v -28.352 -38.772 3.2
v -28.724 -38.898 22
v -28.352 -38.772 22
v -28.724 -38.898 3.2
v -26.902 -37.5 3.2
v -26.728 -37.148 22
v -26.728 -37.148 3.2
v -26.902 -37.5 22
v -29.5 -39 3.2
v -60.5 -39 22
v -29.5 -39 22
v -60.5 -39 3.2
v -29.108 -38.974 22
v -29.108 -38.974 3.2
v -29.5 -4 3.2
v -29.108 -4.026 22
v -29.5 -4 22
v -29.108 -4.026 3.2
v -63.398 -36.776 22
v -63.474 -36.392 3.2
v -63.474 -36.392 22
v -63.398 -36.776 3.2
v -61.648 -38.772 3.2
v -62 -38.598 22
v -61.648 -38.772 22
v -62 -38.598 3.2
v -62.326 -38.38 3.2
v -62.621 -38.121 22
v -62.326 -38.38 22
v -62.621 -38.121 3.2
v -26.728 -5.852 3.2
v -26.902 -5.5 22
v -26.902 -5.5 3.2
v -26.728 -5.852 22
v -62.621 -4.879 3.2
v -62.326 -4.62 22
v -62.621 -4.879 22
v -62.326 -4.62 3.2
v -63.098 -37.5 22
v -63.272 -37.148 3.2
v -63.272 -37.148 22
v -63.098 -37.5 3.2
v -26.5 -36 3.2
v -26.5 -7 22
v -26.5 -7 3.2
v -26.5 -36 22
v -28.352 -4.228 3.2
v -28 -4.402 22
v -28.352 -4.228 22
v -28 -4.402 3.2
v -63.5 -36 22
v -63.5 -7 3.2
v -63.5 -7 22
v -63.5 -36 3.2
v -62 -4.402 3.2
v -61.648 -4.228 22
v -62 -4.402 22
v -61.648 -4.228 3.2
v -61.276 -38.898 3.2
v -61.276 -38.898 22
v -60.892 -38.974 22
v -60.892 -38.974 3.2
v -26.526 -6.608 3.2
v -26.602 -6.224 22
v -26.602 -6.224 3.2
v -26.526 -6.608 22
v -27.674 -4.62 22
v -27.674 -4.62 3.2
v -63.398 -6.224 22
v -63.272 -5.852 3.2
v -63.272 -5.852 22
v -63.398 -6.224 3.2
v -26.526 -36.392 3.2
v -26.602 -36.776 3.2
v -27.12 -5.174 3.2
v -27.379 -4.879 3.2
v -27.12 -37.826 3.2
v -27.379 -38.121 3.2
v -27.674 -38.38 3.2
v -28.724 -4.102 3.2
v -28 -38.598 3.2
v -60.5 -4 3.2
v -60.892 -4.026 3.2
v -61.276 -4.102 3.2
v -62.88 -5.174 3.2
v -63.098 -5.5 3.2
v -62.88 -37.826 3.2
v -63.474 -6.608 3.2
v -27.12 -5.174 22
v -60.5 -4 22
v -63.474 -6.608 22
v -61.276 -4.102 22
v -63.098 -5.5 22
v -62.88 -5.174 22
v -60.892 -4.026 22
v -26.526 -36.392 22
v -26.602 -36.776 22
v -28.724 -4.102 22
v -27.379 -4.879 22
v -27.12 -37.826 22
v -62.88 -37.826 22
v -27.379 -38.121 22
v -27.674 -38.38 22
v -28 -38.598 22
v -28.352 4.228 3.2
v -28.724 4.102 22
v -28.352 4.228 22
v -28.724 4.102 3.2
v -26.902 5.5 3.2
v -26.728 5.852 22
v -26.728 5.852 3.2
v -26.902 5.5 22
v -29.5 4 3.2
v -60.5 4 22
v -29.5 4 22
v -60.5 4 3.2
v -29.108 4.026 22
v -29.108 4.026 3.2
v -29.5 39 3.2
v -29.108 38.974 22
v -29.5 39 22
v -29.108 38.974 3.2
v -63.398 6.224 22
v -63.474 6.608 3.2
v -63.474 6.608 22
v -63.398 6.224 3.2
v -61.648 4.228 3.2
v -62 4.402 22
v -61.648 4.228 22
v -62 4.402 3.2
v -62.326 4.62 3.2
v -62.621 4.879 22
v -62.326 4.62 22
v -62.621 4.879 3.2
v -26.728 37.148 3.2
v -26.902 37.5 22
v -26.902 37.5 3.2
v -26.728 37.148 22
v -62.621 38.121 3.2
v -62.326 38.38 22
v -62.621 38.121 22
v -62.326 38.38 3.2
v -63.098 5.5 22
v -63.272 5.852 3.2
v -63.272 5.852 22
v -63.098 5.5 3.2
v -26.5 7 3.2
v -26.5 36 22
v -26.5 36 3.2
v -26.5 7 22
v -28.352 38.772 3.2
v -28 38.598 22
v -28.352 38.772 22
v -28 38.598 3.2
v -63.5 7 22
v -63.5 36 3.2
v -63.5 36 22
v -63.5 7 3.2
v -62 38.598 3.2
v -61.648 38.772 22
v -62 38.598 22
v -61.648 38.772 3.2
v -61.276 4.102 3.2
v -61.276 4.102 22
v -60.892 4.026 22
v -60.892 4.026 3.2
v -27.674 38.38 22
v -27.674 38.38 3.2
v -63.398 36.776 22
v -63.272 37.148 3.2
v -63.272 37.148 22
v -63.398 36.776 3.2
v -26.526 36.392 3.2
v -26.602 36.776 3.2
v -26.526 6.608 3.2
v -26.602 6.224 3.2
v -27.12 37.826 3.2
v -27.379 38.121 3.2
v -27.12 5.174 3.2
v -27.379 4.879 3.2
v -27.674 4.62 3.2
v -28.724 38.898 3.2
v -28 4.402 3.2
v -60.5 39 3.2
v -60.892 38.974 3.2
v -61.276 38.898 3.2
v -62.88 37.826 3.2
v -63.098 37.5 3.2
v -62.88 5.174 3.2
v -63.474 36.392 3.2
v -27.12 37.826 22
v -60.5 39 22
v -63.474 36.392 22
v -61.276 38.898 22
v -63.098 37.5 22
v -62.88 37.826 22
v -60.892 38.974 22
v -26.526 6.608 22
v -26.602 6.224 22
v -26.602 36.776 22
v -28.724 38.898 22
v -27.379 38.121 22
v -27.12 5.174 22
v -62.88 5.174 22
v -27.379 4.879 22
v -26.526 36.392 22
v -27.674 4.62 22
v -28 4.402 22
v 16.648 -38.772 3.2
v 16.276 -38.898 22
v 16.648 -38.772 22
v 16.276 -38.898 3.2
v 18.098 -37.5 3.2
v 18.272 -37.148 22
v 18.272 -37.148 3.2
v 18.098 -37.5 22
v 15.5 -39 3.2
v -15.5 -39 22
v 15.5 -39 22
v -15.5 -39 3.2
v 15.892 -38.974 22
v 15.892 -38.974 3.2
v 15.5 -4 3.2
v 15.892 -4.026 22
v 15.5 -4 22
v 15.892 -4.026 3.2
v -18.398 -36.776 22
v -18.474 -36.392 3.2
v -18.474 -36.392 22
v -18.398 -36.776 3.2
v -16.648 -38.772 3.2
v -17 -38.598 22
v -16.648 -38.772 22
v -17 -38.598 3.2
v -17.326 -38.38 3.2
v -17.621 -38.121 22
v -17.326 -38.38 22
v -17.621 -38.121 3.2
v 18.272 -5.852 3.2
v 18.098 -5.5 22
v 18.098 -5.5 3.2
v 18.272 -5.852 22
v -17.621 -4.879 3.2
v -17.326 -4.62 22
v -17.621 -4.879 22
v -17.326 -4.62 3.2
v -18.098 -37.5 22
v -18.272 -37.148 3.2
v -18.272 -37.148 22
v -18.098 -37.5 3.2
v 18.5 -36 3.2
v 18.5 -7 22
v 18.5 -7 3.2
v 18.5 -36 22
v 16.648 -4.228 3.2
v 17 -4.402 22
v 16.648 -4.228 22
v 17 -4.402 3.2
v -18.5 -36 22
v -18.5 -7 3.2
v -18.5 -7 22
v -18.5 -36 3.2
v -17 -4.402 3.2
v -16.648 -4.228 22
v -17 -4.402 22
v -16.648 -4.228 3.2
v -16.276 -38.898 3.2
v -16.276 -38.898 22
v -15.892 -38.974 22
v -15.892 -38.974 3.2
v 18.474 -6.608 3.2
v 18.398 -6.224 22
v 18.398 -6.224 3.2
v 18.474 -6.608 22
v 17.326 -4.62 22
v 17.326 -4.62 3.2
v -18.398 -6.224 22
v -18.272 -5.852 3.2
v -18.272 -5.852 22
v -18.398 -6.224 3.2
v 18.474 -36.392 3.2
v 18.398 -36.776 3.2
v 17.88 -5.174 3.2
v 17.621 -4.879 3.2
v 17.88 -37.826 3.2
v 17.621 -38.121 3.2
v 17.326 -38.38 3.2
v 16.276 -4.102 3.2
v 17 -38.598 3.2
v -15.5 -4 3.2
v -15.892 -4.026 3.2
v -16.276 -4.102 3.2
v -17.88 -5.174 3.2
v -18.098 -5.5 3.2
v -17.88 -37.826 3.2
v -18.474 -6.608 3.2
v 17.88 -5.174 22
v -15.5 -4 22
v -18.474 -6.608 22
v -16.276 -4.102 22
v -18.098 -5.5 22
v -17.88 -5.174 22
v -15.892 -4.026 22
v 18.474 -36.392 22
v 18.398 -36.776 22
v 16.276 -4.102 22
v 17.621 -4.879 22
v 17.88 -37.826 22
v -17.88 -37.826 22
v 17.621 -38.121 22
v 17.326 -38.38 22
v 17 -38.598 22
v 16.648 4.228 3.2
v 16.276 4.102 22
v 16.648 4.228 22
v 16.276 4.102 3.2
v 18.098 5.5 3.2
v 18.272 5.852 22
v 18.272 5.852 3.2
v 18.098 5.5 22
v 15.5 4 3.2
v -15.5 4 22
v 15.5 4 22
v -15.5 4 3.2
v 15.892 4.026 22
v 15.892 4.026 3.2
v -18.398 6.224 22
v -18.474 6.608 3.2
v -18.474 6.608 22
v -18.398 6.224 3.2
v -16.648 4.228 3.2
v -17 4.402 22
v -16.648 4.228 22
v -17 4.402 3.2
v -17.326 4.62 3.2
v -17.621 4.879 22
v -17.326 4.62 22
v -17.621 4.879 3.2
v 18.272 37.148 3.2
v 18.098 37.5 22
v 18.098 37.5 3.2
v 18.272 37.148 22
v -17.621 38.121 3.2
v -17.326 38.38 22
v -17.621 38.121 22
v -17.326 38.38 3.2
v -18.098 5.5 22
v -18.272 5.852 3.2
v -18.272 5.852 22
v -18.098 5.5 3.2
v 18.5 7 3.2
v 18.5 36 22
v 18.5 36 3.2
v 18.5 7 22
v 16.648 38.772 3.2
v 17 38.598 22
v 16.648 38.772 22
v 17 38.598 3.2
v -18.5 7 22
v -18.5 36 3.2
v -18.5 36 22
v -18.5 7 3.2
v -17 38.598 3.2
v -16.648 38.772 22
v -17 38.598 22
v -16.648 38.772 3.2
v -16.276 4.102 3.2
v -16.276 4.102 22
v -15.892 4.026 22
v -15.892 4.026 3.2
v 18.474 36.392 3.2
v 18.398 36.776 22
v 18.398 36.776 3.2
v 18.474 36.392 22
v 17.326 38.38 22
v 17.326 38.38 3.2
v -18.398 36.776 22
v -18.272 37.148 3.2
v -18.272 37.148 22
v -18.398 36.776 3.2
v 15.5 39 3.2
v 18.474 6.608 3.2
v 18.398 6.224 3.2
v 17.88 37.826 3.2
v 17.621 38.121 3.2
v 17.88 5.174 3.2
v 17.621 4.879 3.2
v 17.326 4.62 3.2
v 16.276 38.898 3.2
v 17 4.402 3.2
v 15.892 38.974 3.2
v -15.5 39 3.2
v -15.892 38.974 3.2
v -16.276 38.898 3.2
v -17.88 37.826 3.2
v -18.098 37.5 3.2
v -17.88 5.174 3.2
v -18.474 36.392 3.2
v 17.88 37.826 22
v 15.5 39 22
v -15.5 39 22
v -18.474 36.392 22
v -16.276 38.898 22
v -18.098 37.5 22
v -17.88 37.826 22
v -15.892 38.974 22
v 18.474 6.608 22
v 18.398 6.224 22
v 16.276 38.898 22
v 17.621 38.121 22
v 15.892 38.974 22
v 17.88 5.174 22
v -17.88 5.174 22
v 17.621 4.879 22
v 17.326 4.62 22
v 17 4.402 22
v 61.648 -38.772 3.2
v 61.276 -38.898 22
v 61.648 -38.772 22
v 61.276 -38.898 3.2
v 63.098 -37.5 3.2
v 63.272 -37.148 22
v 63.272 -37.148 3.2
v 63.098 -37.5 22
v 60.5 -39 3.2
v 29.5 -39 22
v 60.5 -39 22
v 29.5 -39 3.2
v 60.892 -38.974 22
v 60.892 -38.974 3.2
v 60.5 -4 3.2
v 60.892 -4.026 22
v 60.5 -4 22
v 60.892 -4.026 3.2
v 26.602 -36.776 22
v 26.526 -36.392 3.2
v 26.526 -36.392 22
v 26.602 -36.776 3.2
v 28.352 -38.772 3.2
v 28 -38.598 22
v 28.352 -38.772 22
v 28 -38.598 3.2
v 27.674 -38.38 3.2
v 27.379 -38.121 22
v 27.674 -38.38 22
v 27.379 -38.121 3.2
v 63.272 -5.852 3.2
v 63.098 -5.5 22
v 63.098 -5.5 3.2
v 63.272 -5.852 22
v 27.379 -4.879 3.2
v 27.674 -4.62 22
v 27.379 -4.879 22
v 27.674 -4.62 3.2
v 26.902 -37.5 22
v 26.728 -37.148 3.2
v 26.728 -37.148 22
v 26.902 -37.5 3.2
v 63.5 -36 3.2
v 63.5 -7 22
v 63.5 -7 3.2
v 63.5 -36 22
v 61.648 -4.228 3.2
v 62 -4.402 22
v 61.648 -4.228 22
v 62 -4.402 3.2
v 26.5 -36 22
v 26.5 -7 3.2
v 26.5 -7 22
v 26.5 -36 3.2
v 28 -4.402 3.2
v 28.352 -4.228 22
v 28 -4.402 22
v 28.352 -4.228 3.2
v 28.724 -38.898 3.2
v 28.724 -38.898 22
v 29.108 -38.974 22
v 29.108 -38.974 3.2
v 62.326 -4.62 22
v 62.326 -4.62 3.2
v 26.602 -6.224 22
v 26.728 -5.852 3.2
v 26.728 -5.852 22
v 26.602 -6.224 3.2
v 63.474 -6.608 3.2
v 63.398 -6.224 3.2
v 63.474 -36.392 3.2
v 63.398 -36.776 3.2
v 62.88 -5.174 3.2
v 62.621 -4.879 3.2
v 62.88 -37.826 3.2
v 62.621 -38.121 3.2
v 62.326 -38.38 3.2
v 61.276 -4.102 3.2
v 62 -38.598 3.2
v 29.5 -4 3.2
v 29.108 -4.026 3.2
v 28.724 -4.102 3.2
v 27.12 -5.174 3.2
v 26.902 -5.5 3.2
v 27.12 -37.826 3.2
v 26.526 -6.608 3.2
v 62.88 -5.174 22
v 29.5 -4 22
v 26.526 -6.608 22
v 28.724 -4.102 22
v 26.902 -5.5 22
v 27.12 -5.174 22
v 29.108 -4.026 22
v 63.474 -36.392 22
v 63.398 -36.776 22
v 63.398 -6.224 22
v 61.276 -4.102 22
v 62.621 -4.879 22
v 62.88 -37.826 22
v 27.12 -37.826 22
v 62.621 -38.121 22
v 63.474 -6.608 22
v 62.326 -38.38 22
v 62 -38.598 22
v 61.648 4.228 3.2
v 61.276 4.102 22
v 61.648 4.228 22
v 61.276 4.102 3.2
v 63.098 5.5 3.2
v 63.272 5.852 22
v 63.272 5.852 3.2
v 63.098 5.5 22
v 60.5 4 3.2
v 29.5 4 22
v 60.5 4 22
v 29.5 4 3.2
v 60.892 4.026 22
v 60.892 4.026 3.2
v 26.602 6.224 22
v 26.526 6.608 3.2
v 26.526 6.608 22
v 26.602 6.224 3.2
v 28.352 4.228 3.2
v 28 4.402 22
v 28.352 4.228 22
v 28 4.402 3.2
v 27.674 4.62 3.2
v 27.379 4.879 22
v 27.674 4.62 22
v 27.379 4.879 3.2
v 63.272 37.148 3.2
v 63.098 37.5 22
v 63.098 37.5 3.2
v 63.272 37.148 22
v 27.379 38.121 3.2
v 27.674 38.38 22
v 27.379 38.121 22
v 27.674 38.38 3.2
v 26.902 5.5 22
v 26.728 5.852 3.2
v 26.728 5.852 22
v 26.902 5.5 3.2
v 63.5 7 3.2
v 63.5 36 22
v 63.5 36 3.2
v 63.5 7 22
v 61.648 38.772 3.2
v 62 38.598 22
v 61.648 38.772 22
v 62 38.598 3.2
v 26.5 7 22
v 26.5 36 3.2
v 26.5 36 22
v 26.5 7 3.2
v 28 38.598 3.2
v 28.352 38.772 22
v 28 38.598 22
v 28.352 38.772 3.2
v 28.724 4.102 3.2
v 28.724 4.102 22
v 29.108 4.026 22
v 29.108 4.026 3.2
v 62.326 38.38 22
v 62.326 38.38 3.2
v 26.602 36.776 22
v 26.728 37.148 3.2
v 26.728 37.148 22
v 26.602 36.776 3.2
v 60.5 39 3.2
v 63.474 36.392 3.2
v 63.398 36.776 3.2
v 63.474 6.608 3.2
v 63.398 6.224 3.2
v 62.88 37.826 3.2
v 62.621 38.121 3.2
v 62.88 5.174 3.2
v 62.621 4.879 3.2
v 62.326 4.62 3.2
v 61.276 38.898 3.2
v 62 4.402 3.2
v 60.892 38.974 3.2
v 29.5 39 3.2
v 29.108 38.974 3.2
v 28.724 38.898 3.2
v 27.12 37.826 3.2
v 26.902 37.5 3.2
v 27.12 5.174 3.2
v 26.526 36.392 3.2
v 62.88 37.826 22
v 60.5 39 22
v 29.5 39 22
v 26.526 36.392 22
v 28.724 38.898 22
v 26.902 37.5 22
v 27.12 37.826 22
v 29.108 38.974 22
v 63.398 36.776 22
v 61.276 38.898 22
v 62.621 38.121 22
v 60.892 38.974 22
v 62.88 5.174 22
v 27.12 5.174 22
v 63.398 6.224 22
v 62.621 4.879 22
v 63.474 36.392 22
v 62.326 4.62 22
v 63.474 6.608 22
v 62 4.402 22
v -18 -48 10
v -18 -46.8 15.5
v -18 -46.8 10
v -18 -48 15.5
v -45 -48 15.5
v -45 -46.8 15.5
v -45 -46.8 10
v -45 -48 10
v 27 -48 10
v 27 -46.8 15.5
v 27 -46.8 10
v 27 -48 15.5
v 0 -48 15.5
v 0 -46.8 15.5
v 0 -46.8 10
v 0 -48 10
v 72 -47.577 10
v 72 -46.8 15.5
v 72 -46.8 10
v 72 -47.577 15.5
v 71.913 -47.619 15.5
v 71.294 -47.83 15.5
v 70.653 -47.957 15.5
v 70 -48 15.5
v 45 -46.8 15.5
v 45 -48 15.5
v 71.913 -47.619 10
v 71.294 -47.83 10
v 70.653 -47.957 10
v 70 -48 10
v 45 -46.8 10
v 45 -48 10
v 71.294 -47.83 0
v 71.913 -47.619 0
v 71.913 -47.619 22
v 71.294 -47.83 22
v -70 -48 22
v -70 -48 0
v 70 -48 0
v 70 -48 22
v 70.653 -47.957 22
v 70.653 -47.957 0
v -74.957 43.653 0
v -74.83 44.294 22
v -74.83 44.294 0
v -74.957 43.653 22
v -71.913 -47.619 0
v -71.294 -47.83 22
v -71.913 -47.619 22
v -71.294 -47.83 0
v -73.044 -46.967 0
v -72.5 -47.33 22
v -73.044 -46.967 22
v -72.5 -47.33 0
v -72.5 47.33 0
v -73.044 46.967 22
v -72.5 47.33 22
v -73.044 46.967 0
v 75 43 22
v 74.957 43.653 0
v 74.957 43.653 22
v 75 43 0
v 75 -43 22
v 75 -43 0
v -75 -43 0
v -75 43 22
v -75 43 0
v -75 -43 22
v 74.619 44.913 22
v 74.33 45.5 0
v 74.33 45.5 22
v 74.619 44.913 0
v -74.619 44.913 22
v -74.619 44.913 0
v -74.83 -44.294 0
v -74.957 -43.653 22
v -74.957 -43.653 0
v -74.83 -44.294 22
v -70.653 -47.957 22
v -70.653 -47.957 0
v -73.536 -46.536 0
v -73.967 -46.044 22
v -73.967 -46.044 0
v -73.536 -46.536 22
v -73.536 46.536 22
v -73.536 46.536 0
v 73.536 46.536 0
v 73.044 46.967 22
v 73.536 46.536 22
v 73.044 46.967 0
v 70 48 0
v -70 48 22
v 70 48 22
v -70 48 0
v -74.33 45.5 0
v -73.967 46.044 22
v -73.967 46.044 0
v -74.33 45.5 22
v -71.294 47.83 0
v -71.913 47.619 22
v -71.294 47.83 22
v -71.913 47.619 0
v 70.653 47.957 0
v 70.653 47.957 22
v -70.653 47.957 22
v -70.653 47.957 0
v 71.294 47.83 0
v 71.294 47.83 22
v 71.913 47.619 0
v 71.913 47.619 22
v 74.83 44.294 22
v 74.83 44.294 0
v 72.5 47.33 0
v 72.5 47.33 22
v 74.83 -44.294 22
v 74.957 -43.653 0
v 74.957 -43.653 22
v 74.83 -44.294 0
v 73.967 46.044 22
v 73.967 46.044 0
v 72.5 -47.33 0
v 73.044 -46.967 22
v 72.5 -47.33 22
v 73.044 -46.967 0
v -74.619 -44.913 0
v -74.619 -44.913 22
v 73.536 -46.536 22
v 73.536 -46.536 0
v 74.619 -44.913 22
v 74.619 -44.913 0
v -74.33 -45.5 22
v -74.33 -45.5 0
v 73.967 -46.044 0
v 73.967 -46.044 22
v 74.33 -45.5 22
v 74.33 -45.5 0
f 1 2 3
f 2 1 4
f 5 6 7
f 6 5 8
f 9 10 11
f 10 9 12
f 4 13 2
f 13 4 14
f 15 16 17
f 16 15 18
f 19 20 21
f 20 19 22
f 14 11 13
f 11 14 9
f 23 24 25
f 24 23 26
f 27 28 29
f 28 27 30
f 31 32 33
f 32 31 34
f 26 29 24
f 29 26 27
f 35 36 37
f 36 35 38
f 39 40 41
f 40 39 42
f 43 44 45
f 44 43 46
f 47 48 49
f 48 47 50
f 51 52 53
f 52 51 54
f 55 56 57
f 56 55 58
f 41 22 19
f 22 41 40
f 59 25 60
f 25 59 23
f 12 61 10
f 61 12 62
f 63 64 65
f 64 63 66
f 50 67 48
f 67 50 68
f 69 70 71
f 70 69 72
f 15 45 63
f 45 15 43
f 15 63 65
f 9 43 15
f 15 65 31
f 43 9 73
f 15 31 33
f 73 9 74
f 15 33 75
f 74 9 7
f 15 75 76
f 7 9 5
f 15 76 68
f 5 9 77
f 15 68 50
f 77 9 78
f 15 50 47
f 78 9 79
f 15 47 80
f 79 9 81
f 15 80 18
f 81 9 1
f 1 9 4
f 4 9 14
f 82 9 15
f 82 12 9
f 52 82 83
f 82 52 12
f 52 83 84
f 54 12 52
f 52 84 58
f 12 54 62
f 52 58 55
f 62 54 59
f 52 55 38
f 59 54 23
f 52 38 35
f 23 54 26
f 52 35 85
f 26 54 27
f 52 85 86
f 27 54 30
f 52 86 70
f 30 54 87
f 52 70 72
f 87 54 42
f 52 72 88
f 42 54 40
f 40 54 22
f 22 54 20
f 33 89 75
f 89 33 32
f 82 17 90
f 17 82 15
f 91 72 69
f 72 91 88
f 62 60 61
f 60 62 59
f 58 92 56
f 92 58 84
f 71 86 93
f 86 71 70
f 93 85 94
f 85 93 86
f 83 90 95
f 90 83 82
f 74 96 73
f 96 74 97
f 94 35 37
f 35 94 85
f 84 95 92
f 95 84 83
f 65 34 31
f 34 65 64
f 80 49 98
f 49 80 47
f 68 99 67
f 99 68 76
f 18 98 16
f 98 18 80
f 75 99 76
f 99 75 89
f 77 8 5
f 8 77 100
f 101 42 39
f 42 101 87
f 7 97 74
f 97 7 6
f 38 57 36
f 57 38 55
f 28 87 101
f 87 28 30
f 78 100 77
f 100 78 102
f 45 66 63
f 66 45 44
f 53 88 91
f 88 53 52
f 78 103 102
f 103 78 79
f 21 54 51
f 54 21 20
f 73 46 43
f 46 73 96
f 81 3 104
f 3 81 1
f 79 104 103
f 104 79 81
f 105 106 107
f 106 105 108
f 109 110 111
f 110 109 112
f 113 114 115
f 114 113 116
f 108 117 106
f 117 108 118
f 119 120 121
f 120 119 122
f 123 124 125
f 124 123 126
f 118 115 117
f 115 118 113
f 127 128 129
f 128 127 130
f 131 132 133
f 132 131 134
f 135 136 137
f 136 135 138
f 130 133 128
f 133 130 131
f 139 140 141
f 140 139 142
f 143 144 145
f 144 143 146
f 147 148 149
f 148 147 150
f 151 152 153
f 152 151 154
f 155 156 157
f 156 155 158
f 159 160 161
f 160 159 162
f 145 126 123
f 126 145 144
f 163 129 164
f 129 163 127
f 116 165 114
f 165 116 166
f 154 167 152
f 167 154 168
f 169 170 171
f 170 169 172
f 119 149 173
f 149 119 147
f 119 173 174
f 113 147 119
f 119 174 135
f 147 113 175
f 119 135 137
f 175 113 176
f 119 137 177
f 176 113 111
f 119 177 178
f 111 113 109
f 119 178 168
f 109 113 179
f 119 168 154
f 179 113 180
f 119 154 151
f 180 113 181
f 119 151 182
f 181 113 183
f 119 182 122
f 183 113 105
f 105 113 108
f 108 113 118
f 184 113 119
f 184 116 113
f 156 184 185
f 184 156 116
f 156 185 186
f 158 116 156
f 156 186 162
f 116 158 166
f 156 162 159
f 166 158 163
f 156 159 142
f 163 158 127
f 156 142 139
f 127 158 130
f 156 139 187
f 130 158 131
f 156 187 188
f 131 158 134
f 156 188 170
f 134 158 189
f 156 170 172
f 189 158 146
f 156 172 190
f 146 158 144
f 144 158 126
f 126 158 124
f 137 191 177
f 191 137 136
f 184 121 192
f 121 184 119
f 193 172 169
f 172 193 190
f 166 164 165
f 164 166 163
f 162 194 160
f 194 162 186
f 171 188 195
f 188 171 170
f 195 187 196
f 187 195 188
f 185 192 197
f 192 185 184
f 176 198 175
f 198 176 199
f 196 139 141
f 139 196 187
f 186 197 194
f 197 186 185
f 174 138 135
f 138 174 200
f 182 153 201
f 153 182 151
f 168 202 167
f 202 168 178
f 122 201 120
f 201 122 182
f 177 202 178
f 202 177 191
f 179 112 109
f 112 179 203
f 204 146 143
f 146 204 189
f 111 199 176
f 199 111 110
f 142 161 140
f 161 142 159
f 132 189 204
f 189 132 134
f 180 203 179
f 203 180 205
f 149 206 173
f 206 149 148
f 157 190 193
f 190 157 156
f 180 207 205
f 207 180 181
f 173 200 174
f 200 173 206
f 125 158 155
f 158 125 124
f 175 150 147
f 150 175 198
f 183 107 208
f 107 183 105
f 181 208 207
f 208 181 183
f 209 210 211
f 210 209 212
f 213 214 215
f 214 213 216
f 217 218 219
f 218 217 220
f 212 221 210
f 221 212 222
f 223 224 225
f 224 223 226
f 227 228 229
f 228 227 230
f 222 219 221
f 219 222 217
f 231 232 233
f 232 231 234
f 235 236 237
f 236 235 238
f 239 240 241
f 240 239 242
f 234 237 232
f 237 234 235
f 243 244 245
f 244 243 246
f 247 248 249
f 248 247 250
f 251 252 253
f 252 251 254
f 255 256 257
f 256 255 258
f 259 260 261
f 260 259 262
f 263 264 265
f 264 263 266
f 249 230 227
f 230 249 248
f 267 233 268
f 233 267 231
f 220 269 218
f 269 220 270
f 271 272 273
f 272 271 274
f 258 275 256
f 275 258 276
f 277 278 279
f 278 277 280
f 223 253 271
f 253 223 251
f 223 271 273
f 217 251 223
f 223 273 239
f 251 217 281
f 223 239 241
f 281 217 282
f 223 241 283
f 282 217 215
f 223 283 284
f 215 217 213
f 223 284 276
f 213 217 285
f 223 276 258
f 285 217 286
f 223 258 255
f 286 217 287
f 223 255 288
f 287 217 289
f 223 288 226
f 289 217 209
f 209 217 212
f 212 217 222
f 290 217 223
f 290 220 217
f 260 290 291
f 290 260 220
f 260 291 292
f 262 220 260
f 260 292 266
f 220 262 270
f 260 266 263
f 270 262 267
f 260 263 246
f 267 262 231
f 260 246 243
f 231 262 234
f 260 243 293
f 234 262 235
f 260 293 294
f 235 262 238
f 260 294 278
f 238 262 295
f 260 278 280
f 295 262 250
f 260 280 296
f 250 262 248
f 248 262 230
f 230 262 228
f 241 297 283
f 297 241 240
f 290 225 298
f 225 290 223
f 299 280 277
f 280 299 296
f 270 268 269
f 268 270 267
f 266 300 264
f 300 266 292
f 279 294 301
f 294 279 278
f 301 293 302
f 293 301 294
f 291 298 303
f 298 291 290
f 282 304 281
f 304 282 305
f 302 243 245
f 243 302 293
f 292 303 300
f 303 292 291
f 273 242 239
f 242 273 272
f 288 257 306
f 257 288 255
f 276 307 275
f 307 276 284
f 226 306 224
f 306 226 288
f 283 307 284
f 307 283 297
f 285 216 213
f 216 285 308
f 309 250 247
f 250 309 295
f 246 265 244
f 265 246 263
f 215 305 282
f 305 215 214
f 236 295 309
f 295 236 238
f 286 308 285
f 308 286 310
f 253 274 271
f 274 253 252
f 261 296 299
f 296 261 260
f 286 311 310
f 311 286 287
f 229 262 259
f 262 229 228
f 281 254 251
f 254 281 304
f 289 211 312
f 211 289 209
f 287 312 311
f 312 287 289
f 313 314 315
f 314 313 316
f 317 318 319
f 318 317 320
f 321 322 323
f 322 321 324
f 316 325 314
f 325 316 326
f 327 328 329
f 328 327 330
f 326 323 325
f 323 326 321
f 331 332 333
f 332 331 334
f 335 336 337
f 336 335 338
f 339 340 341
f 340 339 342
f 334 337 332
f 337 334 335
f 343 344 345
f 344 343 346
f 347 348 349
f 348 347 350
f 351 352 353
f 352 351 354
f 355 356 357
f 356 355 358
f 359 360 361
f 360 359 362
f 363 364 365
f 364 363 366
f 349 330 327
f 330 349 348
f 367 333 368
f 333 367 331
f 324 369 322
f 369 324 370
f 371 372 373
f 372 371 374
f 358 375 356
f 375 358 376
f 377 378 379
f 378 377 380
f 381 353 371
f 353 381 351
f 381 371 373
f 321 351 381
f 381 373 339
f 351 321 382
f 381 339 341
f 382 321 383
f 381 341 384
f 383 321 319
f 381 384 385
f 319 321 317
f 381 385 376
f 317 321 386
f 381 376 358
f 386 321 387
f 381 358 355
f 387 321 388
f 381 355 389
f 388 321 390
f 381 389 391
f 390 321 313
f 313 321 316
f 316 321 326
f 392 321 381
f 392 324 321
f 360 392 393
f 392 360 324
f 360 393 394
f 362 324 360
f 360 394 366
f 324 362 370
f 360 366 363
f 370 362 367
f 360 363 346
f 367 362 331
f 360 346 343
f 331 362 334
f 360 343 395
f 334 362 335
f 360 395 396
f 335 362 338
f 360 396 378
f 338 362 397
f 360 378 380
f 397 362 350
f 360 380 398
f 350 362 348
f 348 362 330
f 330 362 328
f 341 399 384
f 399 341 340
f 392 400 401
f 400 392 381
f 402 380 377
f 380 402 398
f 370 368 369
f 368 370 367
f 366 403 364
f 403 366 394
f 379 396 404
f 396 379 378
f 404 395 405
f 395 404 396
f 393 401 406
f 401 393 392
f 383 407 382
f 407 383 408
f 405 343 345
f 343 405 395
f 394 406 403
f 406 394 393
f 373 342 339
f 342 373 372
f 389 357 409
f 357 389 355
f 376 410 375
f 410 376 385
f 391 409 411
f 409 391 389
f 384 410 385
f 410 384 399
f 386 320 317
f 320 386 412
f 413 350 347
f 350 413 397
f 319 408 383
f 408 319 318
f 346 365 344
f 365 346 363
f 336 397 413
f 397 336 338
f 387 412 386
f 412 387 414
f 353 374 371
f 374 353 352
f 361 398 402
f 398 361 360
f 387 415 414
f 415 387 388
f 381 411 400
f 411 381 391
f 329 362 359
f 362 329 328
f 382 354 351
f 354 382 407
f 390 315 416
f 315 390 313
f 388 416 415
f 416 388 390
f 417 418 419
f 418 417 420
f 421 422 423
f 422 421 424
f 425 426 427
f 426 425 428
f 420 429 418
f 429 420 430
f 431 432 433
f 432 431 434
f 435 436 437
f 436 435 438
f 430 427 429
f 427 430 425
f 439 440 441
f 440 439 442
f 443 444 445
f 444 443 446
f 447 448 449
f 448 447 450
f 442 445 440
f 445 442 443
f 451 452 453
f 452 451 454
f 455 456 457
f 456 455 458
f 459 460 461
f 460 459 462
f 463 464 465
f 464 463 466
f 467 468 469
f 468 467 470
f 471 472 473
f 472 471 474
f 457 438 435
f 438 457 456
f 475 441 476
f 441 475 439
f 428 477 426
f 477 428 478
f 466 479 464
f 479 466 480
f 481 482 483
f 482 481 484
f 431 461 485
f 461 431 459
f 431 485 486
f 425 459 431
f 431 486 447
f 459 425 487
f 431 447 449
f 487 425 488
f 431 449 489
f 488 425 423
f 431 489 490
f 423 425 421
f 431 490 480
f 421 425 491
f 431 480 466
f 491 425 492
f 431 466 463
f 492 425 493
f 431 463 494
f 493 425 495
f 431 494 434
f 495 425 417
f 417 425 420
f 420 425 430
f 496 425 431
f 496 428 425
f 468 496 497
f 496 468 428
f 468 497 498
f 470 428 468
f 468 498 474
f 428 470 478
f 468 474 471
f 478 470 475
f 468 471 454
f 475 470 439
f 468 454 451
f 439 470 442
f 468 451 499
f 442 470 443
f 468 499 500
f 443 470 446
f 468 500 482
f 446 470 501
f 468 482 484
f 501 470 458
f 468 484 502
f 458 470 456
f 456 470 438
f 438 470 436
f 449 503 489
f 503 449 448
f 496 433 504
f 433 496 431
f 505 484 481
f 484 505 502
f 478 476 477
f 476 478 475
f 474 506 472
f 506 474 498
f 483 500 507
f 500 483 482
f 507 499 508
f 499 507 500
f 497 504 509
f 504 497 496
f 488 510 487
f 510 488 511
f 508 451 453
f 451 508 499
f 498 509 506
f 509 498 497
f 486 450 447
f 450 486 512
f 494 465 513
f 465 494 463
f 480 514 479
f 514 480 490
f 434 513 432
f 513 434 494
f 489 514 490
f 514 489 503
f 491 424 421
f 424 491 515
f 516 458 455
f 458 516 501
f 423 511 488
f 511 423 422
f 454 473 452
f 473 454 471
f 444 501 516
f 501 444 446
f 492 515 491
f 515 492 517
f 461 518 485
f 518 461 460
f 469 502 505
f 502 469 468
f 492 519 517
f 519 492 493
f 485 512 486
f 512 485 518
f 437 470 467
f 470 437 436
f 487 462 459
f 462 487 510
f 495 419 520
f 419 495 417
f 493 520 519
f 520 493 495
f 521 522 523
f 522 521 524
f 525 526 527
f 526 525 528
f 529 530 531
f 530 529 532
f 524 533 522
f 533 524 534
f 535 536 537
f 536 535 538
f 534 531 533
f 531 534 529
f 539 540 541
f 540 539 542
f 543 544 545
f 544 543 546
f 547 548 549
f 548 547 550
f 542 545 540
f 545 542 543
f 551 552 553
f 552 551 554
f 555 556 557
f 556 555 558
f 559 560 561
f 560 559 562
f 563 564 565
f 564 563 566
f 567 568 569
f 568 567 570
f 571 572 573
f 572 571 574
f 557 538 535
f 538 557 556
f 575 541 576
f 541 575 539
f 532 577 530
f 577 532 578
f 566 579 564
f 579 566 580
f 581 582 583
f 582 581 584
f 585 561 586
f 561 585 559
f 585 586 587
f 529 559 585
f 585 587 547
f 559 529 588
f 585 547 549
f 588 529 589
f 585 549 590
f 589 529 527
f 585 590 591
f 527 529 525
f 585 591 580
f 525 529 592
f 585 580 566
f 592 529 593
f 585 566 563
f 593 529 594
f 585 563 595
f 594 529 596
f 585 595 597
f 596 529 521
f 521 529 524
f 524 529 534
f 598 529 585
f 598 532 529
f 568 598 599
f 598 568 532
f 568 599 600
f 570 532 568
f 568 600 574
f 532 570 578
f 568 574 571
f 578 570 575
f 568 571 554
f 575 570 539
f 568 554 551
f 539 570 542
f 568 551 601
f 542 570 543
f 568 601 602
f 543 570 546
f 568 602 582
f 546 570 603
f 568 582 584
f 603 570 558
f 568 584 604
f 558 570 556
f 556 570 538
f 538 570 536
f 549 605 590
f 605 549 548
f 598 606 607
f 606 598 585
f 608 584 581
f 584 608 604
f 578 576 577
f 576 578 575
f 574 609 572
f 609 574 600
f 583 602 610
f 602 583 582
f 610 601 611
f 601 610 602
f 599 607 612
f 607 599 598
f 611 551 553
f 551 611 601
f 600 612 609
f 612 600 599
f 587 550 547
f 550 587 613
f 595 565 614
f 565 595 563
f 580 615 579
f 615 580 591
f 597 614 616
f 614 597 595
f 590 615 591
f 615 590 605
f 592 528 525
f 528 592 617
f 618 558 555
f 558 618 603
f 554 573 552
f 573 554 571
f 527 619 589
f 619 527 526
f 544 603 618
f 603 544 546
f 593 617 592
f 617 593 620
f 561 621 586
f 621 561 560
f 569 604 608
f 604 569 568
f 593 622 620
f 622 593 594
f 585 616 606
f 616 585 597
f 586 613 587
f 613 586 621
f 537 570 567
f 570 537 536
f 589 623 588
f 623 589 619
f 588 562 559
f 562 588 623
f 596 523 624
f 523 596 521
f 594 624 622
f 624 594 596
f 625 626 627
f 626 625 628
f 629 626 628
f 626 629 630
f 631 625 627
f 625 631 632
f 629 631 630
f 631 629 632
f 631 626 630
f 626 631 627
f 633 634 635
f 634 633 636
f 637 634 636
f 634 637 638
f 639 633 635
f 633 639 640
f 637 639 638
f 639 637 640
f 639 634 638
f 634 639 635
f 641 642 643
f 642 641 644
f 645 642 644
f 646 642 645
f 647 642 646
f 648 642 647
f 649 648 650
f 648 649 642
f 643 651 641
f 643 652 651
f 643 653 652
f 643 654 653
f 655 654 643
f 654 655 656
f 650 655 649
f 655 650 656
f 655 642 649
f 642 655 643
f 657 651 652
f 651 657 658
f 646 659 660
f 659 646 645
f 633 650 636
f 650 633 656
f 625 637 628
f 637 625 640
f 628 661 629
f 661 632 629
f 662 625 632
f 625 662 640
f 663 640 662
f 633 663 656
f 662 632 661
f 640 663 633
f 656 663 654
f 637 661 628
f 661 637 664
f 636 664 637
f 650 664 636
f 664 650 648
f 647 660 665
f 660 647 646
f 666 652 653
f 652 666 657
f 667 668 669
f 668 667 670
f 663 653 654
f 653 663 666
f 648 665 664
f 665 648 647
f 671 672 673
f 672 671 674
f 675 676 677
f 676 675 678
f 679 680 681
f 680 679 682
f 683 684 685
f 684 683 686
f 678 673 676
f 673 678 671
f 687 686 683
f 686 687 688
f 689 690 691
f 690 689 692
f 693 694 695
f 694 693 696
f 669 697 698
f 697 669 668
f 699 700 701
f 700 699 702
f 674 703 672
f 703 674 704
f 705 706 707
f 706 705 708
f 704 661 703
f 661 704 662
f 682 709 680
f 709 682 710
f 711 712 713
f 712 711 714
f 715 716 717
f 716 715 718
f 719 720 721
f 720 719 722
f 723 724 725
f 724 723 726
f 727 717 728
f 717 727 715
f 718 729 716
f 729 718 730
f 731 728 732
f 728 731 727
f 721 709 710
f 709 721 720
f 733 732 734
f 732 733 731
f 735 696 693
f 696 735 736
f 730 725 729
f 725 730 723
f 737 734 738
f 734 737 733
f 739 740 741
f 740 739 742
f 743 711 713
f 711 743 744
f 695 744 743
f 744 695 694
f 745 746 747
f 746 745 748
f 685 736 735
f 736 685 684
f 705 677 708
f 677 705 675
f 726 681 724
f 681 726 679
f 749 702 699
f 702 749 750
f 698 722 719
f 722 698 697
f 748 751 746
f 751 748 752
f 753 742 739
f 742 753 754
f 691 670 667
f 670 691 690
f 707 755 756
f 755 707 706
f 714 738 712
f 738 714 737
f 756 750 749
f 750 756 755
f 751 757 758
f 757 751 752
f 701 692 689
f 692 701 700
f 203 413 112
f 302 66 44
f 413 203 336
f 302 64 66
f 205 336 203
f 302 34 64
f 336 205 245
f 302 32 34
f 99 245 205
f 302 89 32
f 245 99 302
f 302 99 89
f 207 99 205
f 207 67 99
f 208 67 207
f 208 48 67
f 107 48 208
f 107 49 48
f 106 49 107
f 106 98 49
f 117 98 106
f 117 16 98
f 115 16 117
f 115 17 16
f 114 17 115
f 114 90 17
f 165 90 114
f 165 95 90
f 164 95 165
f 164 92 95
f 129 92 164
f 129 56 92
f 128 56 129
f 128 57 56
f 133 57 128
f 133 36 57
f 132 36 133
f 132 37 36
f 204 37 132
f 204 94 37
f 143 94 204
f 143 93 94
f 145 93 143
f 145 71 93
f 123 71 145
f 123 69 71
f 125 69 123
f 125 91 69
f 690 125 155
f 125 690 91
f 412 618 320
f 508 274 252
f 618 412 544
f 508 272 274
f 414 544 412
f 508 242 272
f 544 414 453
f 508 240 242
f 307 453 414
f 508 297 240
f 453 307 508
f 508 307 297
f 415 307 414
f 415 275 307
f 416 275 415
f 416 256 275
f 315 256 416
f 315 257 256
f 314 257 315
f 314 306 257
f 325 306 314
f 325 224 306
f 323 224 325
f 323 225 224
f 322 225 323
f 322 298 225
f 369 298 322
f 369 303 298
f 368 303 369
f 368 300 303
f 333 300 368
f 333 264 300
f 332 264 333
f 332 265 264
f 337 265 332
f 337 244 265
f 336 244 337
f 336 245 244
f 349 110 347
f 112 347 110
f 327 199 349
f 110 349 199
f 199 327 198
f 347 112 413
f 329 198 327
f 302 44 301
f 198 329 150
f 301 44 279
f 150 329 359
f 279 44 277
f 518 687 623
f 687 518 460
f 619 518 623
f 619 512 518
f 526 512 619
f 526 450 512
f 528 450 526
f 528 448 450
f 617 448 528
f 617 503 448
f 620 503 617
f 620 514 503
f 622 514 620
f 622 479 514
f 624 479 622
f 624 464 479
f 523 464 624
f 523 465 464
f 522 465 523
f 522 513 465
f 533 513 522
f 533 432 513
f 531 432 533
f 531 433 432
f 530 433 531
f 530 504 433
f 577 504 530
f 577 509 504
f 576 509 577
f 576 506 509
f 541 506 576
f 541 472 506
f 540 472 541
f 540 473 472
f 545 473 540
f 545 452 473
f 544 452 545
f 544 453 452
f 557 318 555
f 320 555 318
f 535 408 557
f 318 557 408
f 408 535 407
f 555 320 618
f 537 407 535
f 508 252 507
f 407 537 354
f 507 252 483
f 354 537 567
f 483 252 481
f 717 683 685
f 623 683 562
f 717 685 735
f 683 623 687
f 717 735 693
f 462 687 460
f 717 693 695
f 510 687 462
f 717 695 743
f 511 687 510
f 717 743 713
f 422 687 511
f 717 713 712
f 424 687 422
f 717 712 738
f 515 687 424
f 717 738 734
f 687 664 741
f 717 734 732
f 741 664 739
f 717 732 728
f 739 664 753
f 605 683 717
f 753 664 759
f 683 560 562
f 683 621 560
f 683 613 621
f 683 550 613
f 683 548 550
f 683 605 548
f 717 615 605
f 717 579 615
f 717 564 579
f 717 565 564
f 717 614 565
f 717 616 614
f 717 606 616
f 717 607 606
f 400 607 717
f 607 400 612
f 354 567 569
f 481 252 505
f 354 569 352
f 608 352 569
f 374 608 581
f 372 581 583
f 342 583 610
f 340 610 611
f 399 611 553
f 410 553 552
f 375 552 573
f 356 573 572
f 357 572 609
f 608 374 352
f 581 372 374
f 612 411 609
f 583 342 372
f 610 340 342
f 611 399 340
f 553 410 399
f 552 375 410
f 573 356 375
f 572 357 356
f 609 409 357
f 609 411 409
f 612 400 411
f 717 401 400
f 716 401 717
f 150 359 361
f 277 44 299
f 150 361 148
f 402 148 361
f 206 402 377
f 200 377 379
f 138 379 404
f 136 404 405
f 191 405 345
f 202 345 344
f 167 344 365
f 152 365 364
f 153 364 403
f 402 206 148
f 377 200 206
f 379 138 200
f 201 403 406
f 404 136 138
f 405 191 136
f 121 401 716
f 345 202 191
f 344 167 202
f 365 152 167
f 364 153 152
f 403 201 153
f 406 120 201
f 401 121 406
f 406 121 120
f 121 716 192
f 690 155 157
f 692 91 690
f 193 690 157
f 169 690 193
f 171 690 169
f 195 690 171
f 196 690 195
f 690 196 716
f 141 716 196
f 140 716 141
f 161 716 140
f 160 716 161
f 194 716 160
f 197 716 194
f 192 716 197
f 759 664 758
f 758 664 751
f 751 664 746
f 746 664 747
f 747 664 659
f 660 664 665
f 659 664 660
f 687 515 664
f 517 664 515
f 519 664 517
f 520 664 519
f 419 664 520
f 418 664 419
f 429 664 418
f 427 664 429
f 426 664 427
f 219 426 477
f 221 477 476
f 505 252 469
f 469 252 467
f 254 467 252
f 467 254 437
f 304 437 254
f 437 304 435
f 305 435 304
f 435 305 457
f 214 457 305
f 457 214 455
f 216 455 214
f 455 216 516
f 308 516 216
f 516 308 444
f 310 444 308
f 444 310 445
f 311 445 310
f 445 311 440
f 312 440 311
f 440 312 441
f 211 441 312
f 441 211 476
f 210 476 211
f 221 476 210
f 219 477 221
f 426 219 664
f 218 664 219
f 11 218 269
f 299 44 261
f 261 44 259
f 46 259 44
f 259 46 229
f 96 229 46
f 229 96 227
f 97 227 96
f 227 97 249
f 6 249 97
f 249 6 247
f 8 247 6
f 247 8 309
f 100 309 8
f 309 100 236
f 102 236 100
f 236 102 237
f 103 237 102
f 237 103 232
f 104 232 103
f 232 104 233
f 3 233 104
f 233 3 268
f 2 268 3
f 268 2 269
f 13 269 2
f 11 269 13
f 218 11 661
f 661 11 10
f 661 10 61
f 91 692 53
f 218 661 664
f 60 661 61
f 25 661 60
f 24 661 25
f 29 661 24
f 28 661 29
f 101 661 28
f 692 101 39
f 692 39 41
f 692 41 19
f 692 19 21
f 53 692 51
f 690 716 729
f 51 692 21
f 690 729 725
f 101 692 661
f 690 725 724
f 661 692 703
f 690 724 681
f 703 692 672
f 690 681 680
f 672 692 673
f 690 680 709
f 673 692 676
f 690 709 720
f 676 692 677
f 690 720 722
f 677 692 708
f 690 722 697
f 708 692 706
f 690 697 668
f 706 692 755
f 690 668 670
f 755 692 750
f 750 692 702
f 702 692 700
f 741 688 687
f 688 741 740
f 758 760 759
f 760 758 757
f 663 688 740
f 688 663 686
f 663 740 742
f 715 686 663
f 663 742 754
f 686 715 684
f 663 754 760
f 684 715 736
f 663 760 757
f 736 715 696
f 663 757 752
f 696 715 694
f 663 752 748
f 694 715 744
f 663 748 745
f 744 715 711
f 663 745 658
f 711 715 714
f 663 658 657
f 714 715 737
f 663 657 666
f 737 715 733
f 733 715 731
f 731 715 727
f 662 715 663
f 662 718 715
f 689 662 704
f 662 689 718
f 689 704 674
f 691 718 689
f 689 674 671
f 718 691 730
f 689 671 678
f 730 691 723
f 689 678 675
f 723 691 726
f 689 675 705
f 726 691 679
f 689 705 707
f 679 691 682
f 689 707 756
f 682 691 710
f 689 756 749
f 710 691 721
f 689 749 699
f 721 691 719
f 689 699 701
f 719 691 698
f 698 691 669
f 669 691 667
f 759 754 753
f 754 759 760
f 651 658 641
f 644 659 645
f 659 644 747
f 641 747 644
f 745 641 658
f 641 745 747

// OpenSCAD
// SPDX-License-Identifier: MIT
// Camera battery organizer — original generic fit, mm/Z-up.
// CAD prototype ONLY. Measure the battery including swelling and contacts first.
// Not intended for charging, hot batteries, transport safety, or electrical protection.
$fn = 48;
outer_width = 150;
outer_depth = 96;
tray_height = 22;
corner_radius = 5;
floor_thickness = 3.2;
pocket_width = 37;
pocket_depth = 35;
pocket_radius = 3;
x_pitch = 45;
y_pitch = 43;

assert(pocket_width > 5 && pocket_depth > 5);
assert(floor_thickness >= 2.4 && tray_height > floor_thickness + 5);
assert(outer_width/2 - (x_pitch + pocket_width/2) >= 3);
assert(outer_depth/2 - (y_pitch/2 + pocket_depth/2) >= 3);

module round_prism(width, depth, height, radius) {
  linear_extrude(height=height)
    offset(r=radius)
      square([width - 2*radius, depth - 2*radius], center=true);
}

difference() {
  round_prism(outer_width, outer_depth, tray_height, corner_radius);
  // Six deep, generously spaced slots; end surfaces are NOT electrically rated.
  for (ix=[-1:1], iy=[-1,1])
    translate([ix*x_pitch, iy*y_pitch/2, floor_thickness])
      round_prism(pocket_width, pocket_depth, tray_height, pocket_radius);
  // Shallow front label recesses. Leave a positive-thickness front wall.
  for (ix=[-1:1])
    translate([ix*x_pitch, -outer_depth/2-0.1, 10])
      cube([27, 1.3, 5.5], center=false);
}
